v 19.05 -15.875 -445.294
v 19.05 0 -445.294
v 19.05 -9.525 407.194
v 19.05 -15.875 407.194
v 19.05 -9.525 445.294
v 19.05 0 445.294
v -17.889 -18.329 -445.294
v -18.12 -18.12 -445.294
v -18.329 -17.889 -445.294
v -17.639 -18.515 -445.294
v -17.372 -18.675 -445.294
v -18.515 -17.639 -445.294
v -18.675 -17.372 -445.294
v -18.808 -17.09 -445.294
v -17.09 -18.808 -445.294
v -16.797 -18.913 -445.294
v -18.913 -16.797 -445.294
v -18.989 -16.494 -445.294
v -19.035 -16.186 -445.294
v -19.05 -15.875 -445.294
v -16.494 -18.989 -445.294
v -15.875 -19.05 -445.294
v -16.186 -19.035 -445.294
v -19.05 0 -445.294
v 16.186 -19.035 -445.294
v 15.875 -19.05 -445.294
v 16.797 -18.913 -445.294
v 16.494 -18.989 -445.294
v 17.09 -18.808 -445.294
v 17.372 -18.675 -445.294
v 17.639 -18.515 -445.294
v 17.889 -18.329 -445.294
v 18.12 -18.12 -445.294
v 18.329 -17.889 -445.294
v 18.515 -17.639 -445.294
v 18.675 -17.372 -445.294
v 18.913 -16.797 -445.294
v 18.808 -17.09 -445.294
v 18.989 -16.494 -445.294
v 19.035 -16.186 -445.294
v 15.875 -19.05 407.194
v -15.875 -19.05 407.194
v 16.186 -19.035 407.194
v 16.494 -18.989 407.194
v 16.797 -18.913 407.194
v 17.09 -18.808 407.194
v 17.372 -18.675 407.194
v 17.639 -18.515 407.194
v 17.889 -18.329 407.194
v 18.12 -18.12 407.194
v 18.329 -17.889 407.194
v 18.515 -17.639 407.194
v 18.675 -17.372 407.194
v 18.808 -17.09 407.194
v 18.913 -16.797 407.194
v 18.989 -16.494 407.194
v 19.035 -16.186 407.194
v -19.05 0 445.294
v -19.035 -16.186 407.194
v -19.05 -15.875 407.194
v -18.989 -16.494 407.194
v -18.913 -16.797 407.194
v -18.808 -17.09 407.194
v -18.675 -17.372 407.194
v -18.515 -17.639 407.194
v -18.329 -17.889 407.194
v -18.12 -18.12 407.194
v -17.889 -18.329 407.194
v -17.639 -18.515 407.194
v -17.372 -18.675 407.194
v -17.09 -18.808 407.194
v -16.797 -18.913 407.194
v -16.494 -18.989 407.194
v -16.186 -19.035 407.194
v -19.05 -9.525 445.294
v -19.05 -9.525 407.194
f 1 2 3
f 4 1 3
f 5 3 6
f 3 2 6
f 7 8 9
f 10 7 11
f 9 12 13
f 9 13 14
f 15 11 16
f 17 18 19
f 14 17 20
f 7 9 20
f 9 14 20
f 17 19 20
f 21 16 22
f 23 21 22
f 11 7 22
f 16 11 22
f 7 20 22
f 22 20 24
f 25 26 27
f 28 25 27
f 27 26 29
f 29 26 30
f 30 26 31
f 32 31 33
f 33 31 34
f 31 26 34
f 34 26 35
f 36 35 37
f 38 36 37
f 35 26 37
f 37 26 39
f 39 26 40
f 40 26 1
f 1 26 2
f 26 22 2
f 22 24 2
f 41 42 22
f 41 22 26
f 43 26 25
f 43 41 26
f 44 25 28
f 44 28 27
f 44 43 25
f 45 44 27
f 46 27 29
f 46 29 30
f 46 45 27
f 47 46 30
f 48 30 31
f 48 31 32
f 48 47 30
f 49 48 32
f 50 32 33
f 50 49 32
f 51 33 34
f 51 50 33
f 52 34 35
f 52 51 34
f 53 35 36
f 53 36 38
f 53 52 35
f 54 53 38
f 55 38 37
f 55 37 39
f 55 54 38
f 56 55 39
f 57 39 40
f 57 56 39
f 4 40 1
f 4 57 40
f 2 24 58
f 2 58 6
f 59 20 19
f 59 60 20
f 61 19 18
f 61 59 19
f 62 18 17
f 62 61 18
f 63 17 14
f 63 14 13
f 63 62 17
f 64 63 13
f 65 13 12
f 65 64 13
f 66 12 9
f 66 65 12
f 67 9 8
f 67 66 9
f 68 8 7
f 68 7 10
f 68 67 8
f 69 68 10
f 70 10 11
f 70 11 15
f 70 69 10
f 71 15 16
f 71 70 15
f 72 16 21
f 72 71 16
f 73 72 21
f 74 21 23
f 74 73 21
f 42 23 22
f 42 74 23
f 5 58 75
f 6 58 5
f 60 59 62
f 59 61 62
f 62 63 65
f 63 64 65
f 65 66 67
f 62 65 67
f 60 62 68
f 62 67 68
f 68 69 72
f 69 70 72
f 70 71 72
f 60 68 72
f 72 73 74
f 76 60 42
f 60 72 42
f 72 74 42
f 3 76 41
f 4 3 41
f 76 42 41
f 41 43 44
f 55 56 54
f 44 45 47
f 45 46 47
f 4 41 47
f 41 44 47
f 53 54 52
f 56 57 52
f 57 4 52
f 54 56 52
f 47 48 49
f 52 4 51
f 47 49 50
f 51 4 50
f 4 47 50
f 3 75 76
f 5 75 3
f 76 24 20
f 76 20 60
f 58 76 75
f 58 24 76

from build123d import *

# Parameters (mm, degrees)
F0_W     = 38.1
F0_H     = 890.5875
F1_DEPTH = 19.05
F2_W     = 38.1
F2_H     = 38.1
F3_DEPTH = 9.525
F4_R     = 3.175


with BuildPart() as f1:
    # F0 (on Front) → F1 (new body)
    with BuildSketch(Plane.XZ):
        Rectangle(F0_W, F0_H)
    extrude(amount=F1_DEPTH)

    # F2 (on face) → F3 (cut)
    with BuildSketch(Plane.XZ.offset(19.05)):
        with Locations((0, 426.24375)):
            Rectangle(F2_W, F2_H)
    extrude(amount=-F3_DEPTH, mode=Mode.SUBTRACT)

    # F4
    f4_edges = [f1.edges().sort_by_distance(p)[0] for p in [
        (-19.05, -19.05, -19.05),
        (19.05, -19.05, -19.05),
    ]]
    fillet(f4_edges, radius=F4_R)


solid = f1.part
